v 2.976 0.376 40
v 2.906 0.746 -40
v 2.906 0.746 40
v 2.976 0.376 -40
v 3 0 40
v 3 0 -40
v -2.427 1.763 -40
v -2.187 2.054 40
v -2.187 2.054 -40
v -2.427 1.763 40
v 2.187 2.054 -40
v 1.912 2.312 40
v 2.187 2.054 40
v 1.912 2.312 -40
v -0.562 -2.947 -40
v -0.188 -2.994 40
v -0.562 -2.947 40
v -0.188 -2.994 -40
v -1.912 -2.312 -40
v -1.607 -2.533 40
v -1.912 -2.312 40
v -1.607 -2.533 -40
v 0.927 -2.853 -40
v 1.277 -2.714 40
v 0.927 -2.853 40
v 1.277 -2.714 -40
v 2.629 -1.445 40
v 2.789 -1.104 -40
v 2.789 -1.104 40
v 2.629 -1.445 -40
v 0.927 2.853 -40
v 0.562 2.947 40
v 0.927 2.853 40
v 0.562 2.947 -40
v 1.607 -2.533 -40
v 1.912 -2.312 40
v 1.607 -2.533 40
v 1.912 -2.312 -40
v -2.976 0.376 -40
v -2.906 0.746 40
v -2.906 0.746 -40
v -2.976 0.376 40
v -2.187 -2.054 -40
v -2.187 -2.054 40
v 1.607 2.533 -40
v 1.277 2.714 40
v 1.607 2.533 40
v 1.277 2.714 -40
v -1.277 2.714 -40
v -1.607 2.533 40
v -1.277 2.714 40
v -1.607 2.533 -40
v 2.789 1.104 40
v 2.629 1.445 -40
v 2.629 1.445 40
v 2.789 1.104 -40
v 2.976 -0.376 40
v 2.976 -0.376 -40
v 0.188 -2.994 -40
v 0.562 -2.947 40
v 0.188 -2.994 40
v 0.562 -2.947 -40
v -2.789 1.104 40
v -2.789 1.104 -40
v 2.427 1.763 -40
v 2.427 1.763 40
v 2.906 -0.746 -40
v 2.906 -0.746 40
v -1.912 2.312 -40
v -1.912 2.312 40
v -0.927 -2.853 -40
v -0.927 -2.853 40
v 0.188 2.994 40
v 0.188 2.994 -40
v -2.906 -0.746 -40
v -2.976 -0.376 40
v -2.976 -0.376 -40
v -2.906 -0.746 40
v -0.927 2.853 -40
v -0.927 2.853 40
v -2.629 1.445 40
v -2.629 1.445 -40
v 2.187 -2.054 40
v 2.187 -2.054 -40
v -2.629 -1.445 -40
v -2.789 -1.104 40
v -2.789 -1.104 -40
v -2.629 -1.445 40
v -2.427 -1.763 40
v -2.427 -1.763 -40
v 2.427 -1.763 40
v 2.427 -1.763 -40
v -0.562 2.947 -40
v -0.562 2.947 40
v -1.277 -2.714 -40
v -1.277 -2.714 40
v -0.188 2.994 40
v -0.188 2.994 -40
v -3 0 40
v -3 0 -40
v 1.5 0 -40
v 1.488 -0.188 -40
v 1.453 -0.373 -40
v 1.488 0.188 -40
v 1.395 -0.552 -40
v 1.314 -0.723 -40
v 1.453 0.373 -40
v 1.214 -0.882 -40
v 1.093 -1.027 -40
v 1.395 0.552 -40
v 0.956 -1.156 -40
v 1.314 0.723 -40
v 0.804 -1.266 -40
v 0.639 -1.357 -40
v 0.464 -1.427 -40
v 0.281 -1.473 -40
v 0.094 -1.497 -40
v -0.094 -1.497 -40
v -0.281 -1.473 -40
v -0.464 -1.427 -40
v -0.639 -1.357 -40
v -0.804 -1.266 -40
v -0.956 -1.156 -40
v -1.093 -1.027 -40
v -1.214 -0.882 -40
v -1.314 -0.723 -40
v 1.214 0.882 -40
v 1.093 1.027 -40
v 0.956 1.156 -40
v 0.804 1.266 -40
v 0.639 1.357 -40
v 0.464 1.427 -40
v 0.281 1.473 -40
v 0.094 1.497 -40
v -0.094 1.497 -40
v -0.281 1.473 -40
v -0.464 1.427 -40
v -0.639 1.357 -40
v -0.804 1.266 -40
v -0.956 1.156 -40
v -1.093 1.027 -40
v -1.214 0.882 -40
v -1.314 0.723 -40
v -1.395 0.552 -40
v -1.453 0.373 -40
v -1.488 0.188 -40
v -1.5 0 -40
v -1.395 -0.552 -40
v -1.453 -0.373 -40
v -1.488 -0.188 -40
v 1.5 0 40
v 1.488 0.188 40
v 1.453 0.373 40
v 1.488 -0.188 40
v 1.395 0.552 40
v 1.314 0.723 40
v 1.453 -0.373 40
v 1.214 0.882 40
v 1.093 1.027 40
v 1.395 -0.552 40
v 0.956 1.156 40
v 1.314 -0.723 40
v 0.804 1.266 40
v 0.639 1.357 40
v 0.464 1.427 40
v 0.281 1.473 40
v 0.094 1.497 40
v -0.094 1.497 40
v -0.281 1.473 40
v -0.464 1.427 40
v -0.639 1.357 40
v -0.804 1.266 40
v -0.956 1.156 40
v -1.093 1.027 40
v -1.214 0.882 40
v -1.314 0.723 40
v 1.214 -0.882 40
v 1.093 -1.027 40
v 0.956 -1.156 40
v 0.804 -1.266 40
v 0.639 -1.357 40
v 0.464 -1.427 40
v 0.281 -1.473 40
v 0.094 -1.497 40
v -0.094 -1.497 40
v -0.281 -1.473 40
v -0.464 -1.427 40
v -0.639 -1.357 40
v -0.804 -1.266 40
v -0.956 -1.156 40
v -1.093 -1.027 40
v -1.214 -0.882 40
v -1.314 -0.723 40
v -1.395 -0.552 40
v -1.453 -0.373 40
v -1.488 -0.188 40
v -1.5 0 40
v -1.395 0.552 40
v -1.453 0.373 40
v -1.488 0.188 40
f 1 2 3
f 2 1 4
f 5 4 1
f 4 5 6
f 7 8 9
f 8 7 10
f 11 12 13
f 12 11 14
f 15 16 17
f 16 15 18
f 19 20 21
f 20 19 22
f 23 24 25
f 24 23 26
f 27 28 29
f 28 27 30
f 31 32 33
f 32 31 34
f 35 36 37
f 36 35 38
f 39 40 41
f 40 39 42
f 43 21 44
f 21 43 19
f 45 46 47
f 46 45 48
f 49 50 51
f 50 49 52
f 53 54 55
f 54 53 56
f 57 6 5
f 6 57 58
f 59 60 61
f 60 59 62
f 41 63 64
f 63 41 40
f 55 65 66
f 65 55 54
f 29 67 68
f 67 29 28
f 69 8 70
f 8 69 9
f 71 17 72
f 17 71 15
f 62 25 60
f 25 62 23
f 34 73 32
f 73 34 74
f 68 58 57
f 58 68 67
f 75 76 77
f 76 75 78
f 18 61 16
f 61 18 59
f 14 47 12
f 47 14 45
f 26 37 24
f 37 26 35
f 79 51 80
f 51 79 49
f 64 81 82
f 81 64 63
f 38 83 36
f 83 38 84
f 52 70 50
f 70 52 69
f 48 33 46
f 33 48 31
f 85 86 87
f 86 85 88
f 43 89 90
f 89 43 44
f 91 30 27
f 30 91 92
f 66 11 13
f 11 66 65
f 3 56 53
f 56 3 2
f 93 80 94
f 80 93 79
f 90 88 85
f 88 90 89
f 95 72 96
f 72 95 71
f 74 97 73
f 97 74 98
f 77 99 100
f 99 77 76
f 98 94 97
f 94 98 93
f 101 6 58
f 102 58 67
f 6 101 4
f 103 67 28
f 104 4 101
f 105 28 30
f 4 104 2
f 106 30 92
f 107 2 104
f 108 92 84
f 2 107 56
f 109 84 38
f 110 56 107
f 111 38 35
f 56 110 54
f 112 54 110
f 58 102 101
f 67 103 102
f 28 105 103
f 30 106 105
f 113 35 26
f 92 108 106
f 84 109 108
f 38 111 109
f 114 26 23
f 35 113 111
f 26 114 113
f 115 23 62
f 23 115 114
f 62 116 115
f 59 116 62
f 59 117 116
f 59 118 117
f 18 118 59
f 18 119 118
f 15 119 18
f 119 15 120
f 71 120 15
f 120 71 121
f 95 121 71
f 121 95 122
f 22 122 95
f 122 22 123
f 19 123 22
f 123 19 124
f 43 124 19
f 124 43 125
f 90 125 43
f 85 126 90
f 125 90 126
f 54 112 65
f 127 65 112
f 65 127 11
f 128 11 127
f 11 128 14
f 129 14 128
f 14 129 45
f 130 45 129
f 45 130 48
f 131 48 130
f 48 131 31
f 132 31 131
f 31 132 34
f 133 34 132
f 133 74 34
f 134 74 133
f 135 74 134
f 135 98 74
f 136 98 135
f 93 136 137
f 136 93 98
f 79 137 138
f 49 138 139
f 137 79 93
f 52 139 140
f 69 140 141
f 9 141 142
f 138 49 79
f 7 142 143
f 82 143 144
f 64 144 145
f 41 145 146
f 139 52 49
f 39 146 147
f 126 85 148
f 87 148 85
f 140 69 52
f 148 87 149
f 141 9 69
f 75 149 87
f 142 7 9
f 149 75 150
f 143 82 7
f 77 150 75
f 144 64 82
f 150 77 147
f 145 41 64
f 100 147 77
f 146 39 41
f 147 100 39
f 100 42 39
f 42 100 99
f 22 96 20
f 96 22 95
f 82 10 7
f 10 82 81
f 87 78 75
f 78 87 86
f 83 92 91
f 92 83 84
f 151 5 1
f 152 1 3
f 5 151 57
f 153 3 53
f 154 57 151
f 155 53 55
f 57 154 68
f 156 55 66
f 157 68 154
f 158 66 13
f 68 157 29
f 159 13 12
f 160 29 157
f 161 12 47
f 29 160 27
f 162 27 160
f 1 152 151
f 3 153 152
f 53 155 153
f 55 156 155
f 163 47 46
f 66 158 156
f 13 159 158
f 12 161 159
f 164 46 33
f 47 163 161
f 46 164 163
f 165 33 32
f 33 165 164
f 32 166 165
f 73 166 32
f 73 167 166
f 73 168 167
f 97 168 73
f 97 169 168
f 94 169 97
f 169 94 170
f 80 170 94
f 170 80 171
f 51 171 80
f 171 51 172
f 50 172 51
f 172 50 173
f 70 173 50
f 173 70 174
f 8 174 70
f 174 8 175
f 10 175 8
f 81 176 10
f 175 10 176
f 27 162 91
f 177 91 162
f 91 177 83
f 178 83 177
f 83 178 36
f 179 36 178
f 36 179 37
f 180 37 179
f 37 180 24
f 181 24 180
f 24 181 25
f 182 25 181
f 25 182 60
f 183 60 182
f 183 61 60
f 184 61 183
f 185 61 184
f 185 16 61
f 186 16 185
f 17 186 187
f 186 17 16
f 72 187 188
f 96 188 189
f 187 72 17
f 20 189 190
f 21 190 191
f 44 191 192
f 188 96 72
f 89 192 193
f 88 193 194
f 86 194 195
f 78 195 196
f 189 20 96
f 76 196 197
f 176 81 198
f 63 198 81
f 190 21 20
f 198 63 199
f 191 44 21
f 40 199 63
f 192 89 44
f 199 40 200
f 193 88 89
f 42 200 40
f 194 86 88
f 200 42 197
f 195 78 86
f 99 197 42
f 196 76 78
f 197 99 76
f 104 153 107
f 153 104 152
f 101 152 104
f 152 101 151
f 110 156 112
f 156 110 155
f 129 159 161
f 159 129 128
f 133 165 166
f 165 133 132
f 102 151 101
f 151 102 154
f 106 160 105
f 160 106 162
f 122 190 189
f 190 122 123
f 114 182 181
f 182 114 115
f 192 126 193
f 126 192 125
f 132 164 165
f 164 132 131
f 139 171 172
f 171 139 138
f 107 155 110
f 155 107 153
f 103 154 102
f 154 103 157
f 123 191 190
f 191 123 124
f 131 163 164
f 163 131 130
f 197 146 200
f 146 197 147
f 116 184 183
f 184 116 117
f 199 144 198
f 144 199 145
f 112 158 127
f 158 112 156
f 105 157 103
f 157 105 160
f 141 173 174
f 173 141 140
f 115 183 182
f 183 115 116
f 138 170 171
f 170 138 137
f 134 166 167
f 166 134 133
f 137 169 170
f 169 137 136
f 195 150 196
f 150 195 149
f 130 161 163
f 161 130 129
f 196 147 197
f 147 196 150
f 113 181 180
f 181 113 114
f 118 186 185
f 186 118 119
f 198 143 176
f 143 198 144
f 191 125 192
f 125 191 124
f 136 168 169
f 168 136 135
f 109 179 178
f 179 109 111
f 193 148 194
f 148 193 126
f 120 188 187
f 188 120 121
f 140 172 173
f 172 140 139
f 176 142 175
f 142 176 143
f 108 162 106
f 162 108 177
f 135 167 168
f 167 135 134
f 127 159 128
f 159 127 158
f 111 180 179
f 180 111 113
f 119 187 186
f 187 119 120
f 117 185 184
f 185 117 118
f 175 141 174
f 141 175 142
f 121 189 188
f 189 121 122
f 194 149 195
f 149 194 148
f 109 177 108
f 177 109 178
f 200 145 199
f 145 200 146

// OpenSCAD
$fn = 50;


difference() {
	union() {
		translate(v = [0, 0, -40.0000000000]) {
			cylinder(h = 80, r = 3.0000000000);
		}
	}
	union() {
		translate(v = [0, 0, -100.0000000000]) {
			cylinder(h = 200, r = 1.5000000000);
		}
	}
}
